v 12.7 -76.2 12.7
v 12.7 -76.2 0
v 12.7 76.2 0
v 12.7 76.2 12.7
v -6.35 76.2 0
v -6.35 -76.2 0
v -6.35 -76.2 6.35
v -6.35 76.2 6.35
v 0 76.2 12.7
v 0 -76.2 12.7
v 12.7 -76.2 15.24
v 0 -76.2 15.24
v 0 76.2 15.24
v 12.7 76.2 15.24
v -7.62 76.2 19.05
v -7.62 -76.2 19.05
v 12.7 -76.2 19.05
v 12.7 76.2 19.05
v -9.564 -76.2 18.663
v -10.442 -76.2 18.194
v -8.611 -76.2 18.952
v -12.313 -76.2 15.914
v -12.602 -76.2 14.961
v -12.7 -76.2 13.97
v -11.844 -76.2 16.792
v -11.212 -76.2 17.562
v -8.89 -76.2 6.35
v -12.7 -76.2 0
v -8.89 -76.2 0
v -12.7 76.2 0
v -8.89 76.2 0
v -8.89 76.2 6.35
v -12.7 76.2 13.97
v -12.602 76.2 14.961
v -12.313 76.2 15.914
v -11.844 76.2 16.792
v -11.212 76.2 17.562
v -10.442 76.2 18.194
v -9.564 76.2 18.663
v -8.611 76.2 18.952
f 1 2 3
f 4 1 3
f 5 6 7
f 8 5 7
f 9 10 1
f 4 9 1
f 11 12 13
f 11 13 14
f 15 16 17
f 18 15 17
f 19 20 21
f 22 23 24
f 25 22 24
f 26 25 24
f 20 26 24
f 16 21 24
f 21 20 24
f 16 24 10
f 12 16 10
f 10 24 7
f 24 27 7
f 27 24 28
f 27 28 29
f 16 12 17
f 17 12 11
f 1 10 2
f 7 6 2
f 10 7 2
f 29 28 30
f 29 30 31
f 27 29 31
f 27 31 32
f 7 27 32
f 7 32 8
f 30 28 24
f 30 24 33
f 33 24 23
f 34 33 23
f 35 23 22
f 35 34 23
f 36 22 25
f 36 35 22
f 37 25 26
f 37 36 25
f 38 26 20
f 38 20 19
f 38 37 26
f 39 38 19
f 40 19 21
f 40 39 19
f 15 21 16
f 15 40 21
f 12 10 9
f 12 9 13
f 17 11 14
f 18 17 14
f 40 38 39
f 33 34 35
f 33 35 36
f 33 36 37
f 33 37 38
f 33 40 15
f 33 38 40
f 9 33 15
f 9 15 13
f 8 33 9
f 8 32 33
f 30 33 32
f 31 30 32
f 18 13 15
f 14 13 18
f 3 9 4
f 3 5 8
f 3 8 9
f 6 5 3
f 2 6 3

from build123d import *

# Parameters (mm, degrees)
F0_W     = 25.4
F0_H     = 152.4
F1_DEPTH = 19.05
F2_W     = 12.7
F2_H     = 2.54
F2_W_2   = 2.54
F2_H_2   = 6.35
F3_DEPTH = 177.8
F4_R     = 5.08


with BuildPart() as f1:
    # F0 (on Top) → F1 (new body)
    with BuildSketch(Plane.XY):
        Rectangle(F0_W, F0_H)
    extrude(amount=F1_DEPTH)

    # F2 (on face) → F3 (cut)
    with BuildSketch(Plane.XZ.offset(76.2)):
        with Locations((6.35, 13.97)):
            Rectangle(F2_W, F2_H)
        with Locations((-7.62, 3.175)):
            Rectangle(F2_W_2, F2_H_2)
    extrude(amount=-F3_DEPTH, mode=Mode.SUBTRACT)

    # F4
    f4_edges = [f1.edges().sort_by_distance(p)[0] for p in [
        (-12.7, 0, 19.05),
    ]]
    fillet(f4_edges, radius=F4_R)


solid = f1.part
